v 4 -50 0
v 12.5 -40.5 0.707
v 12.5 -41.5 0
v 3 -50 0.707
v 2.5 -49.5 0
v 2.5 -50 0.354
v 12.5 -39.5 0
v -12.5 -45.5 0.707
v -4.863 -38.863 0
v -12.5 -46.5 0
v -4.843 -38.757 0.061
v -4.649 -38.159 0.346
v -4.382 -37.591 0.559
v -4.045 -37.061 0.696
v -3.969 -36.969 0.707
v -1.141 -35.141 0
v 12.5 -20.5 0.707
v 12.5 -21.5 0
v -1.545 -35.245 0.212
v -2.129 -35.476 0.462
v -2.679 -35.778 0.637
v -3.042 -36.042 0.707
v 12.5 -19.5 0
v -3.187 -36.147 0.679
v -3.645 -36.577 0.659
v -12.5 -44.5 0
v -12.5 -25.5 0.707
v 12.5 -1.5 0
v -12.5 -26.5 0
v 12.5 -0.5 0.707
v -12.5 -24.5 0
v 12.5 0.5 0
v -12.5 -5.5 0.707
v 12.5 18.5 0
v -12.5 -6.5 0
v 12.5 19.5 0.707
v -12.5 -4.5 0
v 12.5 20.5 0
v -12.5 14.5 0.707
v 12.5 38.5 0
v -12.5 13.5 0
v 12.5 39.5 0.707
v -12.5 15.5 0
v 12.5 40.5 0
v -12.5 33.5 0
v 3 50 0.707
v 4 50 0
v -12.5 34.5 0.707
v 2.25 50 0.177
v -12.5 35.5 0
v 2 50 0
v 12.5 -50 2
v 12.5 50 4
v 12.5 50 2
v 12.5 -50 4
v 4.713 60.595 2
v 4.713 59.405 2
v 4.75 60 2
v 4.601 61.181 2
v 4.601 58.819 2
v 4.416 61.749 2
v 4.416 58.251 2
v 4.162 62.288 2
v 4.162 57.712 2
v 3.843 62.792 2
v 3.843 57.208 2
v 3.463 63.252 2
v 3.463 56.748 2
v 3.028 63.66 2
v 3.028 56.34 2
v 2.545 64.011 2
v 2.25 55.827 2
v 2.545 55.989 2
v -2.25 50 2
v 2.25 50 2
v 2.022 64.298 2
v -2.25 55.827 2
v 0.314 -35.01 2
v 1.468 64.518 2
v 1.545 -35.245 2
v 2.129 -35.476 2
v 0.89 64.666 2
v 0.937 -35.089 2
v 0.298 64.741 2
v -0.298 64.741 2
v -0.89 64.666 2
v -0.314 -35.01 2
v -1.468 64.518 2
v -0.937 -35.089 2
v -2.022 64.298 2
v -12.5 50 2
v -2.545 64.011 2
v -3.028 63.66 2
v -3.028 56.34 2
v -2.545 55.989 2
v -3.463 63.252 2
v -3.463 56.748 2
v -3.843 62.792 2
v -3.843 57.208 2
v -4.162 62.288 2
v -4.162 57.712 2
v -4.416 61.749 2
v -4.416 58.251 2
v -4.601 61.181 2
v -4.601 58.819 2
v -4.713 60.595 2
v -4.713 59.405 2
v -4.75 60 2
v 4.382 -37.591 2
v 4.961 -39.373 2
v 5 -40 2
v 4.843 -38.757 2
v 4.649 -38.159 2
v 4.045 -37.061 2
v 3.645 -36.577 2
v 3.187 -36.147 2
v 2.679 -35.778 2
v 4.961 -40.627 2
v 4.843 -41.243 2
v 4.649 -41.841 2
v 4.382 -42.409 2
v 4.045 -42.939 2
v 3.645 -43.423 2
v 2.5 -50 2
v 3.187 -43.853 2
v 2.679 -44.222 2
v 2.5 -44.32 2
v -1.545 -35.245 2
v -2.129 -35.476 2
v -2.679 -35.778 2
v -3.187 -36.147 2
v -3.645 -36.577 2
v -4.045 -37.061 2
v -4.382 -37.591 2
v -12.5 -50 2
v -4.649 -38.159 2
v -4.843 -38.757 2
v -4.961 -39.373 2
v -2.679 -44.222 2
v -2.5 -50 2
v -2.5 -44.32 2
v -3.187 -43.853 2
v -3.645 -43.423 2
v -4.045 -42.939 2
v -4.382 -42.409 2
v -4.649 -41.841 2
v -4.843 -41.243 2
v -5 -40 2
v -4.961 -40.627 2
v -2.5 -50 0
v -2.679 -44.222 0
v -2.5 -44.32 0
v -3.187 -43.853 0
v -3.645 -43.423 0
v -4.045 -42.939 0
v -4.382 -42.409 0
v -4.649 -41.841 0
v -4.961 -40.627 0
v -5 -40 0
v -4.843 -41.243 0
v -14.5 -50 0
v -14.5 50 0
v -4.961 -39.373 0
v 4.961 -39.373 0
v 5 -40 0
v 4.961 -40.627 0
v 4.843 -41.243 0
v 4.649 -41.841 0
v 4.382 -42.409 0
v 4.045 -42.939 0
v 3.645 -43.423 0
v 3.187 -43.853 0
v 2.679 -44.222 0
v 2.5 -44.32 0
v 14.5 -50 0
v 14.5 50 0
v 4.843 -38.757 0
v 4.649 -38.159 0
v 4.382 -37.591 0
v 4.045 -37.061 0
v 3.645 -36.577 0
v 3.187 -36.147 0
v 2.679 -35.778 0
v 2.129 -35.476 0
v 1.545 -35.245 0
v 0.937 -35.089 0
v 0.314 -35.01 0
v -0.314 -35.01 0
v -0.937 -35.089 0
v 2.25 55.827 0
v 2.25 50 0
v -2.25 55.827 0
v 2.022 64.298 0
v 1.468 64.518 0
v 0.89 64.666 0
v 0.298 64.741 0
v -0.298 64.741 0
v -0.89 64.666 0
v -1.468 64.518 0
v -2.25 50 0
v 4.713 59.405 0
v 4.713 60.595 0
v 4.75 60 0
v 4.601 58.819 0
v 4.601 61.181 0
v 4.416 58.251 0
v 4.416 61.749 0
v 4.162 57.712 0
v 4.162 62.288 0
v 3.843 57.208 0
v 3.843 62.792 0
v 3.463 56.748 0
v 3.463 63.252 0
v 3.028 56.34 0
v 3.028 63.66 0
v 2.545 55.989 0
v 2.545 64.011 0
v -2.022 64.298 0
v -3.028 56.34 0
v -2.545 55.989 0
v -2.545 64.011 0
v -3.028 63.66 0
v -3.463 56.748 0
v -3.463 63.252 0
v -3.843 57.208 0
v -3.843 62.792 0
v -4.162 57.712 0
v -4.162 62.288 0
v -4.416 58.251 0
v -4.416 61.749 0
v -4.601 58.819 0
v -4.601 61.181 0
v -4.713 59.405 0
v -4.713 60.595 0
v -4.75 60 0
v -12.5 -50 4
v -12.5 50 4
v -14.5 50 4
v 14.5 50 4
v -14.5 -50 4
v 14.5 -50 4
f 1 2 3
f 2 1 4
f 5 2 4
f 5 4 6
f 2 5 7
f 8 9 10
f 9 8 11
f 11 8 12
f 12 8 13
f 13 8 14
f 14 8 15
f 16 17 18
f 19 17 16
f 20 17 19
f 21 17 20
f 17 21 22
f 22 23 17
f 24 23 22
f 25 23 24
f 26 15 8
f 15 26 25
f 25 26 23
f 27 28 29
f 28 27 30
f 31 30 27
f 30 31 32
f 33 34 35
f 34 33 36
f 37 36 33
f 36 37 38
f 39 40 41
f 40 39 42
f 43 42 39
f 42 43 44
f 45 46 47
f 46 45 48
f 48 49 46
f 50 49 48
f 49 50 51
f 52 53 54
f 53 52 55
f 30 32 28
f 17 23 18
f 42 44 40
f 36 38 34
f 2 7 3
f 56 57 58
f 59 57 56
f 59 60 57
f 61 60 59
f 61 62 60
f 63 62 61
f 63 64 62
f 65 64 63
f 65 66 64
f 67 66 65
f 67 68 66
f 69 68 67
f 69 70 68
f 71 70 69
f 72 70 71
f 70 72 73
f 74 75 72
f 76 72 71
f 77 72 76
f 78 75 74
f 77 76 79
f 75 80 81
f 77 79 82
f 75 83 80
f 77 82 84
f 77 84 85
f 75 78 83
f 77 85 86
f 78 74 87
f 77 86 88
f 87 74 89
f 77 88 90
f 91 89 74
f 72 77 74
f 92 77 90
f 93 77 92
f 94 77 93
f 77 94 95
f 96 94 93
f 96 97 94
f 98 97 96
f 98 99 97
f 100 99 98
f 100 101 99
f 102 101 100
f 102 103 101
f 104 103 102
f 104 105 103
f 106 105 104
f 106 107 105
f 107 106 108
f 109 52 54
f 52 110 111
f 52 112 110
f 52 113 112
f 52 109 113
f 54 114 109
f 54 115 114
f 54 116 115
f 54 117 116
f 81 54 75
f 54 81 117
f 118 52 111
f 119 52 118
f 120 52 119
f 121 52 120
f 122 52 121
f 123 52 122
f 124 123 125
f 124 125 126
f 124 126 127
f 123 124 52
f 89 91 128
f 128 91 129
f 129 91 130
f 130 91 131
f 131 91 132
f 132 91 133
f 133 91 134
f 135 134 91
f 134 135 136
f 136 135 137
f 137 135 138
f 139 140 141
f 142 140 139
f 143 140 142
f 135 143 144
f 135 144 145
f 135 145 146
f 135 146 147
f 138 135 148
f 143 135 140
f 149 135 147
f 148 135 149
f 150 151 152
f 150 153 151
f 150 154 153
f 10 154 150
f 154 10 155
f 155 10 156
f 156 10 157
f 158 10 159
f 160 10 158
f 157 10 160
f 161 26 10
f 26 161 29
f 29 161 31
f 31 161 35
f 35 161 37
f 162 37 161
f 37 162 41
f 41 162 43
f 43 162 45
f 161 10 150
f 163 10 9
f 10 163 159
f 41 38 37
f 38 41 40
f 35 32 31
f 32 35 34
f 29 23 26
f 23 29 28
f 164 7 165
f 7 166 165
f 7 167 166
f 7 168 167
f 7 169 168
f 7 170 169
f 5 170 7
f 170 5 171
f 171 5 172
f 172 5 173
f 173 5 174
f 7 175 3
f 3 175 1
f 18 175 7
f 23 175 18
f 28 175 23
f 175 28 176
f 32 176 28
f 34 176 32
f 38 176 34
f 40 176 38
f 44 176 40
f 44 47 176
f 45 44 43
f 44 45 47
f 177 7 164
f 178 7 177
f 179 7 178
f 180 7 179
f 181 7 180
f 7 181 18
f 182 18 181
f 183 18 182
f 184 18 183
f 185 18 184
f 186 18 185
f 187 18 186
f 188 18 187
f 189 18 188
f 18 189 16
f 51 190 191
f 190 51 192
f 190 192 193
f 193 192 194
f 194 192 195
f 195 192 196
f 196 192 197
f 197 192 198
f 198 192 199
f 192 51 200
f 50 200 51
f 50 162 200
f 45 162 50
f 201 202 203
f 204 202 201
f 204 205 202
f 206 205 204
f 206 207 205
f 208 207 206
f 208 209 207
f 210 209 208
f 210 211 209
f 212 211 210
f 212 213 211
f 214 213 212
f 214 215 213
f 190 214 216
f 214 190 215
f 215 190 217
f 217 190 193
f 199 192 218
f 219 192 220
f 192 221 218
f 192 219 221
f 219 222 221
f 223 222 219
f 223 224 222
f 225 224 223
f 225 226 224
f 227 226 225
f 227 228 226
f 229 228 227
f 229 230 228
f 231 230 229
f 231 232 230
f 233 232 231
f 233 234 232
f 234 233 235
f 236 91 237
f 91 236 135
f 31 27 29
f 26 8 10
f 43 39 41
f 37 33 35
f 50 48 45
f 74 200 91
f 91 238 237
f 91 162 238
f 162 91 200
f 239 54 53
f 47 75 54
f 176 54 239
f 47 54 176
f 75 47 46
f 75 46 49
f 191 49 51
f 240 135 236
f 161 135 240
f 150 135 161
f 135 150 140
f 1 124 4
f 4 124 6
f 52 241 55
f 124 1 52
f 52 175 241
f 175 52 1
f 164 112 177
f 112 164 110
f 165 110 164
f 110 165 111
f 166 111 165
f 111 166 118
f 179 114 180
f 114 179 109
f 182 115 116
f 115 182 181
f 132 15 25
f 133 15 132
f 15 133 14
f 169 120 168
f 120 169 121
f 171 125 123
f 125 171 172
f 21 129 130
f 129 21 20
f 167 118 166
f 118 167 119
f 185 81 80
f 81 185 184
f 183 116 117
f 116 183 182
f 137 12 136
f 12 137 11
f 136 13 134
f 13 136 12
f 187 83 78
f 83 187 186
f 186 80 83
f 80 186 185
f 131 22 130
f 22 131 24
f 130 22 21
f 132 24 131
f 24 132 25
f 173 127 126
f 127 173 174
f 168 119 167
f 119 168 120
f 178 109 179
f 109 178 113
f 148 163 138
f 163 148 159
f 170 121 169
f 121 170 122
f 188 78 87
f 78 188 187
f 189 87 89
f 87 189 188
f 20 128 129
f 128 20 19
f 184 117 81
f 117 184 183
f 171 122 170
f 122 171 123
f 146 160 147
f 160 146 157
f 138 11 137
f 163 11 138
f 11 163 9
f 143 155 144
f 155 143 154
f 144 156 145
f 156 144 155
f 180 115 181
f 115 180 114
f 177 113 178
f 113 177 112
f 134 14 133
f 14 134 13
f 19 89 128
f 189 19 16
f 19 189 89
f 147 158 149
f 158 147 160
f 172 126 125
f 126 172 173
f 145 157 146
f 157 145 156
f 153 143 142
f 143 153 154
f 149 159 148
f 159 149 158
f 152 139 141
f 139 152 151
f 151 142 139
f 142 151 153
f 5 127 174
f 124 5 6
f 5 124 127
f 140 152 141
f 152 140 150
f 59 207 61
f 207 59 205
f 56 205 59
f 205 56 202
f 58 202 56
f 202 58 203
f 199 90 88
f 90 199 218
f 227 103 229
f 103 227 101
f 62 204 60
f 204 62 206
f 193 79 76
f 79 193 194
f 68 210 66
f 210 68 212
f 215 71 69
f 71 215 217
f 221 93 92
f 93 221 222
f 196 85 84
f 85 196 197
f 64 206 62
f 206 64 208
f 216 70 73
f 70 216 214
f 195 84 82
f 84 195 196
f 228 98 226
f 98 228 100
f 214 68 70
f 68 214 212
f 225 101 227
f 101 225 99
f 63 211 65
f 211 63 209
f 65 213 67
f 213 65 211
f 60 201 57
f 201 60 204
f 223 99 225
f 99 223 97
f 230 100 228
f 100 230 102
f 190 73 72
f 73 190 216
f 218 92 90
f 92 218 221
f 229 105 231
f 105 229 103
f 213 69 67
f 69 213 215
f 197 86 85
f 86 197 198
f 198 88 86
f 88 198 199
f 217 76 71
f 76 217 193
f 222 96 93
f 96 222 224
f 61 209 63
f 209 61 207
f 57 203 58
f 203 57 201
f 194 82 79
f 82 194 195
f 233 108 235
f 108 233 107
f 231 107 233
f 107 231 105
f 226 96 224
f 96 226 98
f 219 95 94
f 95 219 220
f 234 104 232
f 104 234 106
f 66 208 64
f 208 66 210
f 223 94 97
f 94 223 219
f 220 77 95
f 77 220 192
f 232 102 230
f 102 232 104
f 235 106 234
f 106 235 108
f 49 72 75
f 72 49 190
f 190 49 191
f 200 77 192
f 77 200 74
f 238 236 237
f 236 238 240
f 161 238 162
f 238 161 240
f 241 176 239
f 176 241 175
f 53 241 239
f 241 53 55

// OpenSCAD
part = "straight"; // [curved_left:Curve Left,curved_right:Curve Right,straight:Straight,intersection:Intersection]

// Interior width of the track.
track_width = 25;
// Length of straight parts compared to width of the track.
track_length_to_width_ratio = 4;
track_length = track_width * track_length_to_width_ratio;
track_lip_width = 2;
track_lip_height = 2;
// Thickness of the track's base. Recommend a minimimum of at least 2mm.
track_base_height = 2;
// Radius of curved track vs. length of a straight track segment.
track_curve_radius_to_length_ratio = 1.3333;  
track_height = track_base_height + track_lip_height;
// Size of the ball joint.
ball_diameter = 10;
// The amount of gap to leave around the joined parts.  Varies by printer.  
join_tolerance = 0.5;  

/* [Hidden] */
$fn = 50;

/*
track_intersection();
translate([0,track_length,0]) track_straight();
translate([0,-track_length,0]) track_straight();
translate([track_length/2,-track_length/2+track_width/2+track_lip_width,0]) rotate([0,0,180]) track_curved_left();
translate([-track_length/2,track_length/2-track_width/2-track_lip_width,0]) rotate([0,0,-90]) track_curved_right();
*/

print_part();

module print_part() {
    if(part == "curved_left") {
        track_curved_left();
    } else if(part == "curved_right") {
        track_curved_right();
    } else if(part == "straight") {
        track_straight();
    } else if(part == "intersection") {
        track_intersection();
    }
}

module track_straight() {
    deck(track_width, track_length, track_base_height);
    translate([-track_width/2-track_lip_width,-track_length/2,0]) cube([track_lip_width, track_length, track_height]);
    translate([track_width/2,-track_length/2,0]) cube([track_lip_width, track_length, track_height]);
}

module track_curved_left() {
    curve_diameter = track_length / (track_curve_radius_to_length_ratio / 2);
    difference() {
        union() {
            difference() {
                cylinder(d=curve_diameter,h=track_height);
                translate([0,0,track_base_height]) cylinder(d=curve_diameter-track_lip_width*2,h=track_height);
            }
            cylinder(d=curve_diameter-((track_width+track_lip_width)*2),h=track_height);
        }
        translate([0,0,-1]) cylinder(d=curve_diameter-((track_width+track_lip_width*2)*2),h=track_height+2);
        translate([-100,0,-1]) cube([200,100,100]);
        translate([0,-100,-1]) cube([100,200,100]);
        translate([-curve_diameter/2+track_lip_width+track_width/2,-ball_diameter,-1]) cylinder(d=ball_diameter,h=track_base_height+2);
        translate([-curve_diameter/2+track_lip_width+track_width/2-ball_diameter/4,-ball_diameter,-1]) cube([ball_diameter/2,ball_diameter+1,track_base_height+2]);
        groove_size = 1;
        for(i=[-200:20:200]) {
            translate([-100,i + 3,0]) rotate([-45,90,0]) rotate([0,0,45]) translate([-groove_size/2,-groove_size/2,0]) cube([groove_size,groove_size,200]);
        }
    }
    translate([ball_diameter,-curve_diameter/2+track_lip_width+track_width/2,0]) cylinder(d=ball_diameter-join_tolerance,h=track_base_height);
    translate([0,-curve_diameter/2+track_lip_width+track_width/2-(ball_diameter/2-join_tolerance)/2,0]) cube([ball_diameter,ball_diameter/2-join_tolerance,track_base_height]);
}

module track_curved_right() {
    mirror() track_curved_left();
}

module track_intersection() {
    deck(track_width, track_length, track_base_height);
    rotate([0,0,90]) deck(track_width, track_length, track_base_height);
    
    for(i=[0:90:270]) {
        rotate([0,0,i]) track_intersection_quadrant();
    }
}

module track_intersection_quadrant() {
    inner_radius = track_width/2;
    difference() {
        union() {
            translate([track_width/2+inner_radius, track_width/2+inner_radius, 0]) cylinder(r=inner_radius, h=track_height);
            translate([track_width/2, track_width/2, 0]) cube([inner_radius, inner_radius, track_base_height]);
        }
        translate([track_width/2+inner_radius, track_width/2+inner_radius, -1]) cylinder(r=inner_radius-track_lip_width, h=track_height+2);
        translate([track_width/2+inner_radius, track_width/2+track_lip_width, -1]) cube([inner_radius*2+1,inner_radius*2+1,track_height*2+2]);
        translate([track_width/2+track_lip_width, track_width/2+inner_radius, -1]) cube([inner_radius*2+1,inner_radius*2+1,track_height*2+2]);
    }
    translate([track_width/2+inner_radius, track_width/2, 0]) cube([track_length/2-track_width/2-inner_radius, track_lip_width, track_height]);
    translate([track_width/2, track_width/2+inner_radius, 0]) cube([track_lip_width, track_length/2-track_width/2-inner_radius, track_height]);
}

module deck(x, y, z) {
    difference() {
        translate([-x/2,-y/2,0]) cube([x,y,z]);
        
        translate([0,-y/2+ball_diameter,-1]) cylinder(d=ball_diameter,h=z+2);
        translate([-ball_diameter/4,-y/2-1,-1]) cube([ball_diameter/2,ball_diameter,z+2]);
        groove_size = 1;
        for(i=[-200:20:200]) {
            translate([-100,i - 13,0]) rotate([-45,90,0]) rotate([0,0,45]) translate([-groove_size/2,-groove_size/2,0]) cube([groove_size,groove_size,200]);
        }
    }
    translate([0,y/2+ball_diameter,0]) cylinder(d=ball_diameter-join_tolerance,h=z);
    translate([-(ball_diameter/2-join_tolerance)/2,y/2,0]) cube([ball_diameter/2-join_tolerance,ball_diameter,z]);
}
